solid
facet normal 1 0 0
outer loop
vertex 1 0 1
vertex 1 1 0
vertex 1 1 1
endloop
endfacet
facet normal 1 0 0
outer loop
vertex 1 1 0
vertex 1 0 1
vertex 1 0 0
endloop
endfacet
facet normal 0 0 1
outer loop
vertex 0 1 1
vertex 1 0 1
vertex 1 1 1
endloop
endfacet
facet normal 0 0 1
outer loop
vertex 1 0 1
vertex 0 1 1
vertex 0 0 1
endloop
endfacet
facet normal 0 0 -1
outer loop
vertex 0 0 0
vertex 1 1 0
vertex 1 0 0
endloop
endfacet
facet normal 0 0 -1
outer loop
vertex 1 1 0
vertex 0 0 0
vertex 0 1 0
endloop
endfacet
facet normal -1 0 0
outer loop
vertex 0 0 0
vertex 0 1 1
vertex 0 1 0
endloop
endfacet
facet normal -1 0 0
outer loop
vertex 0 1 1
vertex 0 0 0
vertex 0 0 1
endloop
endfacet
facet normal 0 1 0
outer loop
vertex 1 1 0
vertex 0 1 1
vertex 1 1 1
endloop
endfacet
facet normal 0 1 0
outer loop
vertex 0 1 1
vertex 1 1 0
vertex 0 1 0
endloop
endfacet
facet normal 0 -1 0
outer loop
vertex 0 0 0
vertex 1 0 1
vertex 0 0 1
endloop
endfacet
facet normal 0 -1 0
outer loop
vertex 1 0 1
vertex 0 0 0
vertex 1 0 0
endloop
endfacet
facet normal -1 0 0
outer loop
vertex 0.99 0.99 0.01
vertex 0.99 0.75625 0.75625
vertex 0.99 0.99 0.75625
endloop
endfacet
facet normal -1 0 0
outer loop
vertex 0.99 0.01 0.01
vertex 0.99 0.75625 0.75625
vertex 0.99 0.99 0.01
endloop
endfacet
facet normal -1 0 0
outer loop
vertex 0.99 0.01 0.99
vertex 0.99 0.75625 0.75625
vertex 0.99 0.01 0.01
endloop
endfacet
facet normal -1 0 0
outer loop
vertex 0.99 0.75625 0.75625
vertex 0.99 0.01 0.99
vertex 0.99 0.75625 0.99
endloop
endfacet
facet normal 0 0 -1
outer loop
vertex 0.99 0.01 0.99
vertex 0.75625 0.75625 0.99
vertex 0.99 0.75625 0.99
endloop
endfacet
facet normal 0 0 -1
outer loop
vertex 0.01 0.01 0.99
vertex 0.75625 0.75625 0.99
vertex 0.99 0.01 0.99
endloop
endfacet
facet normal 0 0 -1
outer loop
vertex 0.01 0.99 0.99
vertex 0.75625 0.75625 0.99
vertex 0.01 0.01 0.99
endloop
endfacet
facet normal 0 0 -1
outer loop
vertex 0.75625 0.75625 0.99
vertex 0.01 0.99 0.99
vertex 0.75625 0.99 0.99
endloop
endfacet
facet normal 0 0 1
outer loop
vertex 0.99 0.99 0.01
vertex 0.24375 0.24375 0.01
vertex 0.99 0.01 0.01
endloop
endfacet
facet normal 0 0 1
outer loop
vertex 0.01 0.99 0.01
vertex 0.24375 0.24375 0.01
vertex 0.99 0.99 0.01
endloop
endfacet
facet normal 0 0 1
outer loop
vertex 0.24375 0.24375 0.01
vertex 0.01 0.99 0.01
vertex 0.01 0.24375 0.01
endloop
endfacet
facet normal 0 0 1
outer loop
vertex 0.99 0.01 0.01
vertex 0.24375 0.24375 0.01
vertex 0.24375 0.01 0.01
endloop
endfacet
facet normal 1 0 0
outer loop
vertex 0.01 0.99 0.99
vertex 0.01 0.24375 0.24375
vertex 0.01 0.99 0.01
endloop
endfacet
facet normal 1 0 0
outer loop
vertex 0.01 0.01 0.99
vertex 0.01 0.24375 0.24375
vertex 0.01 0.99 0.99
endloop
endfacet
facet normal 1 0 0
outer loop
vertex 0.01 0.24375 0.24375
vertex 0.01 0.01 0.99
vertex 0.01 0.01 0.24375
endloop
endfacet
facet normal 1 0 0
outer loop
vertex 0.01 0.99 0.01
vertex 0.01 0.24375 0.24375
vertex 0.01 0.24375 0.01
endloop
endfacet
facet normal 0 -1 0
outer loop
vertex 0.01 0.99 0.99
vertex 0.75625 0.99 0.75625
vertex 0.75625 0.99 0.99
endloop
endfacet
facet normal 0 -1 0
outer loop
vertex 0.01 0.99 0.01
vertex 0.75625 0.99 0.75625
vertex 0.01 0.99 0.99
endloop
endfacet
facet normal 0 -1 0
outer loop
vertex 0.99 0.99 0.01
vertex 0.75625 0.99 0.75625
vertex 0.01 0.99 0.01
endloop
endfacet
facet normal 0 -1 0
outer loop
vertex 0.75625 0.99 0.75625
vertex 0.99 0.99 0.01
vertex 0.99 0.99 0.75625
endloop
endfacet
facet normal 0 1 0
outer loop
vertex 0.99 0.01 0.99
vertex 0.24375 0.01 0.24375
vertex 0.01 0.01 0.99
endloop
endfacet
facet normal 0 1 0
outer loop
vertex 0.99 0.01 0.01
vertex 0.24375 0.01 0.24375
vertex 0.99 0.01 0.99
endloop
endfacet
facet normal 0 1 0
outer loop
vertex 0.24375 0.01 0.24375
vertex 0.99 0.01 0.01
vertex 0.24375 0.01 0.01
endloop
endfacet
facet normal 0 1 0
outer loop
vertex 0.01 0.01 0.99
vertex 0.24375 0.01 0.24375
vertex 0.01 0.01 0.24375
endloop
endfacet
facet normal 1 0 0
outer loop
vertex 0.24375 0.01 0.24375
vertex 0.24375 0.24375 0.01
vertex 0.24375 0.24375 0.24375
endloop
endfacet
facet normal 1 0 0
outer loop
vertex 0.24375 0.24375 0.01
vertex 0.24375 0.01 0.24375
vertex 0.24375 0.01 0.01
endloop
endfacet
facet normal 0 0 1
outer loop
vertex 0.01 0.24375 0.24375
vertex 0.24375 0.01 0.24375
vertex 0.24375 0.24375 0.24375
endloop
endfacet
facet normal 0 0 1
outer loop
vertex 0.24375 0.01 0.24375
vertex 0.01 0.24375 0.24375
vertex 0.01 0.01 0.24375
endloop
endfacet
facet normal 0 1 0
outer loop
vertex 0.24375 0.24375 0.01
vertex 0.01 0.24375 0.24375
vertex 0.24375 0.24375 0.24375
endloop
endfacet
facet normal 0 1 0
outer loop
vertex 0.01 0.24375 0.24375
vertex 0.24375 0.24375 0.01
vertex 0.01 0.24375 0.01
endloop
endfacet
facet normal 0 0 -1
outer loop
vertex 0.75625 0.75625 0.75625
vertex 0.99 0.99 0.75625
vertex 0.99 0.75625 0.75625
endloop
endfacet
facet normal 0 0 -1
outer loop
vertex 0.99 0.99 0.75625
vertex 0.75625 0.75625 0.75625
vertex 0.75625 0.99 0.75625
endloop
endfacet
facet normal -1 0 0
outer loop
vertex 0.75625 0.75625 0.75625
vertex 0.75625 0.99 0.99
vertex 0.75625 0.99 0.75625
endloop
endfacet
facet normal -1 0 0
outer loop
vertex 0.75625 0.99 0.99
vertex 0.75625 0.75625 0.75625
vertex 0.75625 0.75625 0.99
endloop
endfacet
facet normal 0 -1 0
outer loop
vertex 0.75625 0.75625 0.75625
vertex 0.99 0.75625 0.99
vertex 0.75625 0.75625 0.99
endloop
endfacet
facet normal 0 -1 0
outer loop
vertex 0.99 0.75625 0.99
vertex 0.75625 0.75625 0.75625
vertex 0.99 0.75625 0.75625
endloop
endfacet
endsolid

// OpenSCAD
translate([0.125, 0.125, 0.125]) color([0.3999241673751073, 0.7781768293822428, 0.17994174312030797]) cube([0.2375, 0.2375, 0.2375], center=true);
translate([0.875, 0.875, 0.875]) color([0.8612539028001464, 0.20612804304271737, 0.0716566971794208]) cube([0.2375, 0.2375, 0.2375], center=true);
color([0.3,0.3,0.3,0.3]) difference() { cube([1,1,1]); translate([0.01,0.01,0.01]) cube([0.98,0.98,0.98]); }
